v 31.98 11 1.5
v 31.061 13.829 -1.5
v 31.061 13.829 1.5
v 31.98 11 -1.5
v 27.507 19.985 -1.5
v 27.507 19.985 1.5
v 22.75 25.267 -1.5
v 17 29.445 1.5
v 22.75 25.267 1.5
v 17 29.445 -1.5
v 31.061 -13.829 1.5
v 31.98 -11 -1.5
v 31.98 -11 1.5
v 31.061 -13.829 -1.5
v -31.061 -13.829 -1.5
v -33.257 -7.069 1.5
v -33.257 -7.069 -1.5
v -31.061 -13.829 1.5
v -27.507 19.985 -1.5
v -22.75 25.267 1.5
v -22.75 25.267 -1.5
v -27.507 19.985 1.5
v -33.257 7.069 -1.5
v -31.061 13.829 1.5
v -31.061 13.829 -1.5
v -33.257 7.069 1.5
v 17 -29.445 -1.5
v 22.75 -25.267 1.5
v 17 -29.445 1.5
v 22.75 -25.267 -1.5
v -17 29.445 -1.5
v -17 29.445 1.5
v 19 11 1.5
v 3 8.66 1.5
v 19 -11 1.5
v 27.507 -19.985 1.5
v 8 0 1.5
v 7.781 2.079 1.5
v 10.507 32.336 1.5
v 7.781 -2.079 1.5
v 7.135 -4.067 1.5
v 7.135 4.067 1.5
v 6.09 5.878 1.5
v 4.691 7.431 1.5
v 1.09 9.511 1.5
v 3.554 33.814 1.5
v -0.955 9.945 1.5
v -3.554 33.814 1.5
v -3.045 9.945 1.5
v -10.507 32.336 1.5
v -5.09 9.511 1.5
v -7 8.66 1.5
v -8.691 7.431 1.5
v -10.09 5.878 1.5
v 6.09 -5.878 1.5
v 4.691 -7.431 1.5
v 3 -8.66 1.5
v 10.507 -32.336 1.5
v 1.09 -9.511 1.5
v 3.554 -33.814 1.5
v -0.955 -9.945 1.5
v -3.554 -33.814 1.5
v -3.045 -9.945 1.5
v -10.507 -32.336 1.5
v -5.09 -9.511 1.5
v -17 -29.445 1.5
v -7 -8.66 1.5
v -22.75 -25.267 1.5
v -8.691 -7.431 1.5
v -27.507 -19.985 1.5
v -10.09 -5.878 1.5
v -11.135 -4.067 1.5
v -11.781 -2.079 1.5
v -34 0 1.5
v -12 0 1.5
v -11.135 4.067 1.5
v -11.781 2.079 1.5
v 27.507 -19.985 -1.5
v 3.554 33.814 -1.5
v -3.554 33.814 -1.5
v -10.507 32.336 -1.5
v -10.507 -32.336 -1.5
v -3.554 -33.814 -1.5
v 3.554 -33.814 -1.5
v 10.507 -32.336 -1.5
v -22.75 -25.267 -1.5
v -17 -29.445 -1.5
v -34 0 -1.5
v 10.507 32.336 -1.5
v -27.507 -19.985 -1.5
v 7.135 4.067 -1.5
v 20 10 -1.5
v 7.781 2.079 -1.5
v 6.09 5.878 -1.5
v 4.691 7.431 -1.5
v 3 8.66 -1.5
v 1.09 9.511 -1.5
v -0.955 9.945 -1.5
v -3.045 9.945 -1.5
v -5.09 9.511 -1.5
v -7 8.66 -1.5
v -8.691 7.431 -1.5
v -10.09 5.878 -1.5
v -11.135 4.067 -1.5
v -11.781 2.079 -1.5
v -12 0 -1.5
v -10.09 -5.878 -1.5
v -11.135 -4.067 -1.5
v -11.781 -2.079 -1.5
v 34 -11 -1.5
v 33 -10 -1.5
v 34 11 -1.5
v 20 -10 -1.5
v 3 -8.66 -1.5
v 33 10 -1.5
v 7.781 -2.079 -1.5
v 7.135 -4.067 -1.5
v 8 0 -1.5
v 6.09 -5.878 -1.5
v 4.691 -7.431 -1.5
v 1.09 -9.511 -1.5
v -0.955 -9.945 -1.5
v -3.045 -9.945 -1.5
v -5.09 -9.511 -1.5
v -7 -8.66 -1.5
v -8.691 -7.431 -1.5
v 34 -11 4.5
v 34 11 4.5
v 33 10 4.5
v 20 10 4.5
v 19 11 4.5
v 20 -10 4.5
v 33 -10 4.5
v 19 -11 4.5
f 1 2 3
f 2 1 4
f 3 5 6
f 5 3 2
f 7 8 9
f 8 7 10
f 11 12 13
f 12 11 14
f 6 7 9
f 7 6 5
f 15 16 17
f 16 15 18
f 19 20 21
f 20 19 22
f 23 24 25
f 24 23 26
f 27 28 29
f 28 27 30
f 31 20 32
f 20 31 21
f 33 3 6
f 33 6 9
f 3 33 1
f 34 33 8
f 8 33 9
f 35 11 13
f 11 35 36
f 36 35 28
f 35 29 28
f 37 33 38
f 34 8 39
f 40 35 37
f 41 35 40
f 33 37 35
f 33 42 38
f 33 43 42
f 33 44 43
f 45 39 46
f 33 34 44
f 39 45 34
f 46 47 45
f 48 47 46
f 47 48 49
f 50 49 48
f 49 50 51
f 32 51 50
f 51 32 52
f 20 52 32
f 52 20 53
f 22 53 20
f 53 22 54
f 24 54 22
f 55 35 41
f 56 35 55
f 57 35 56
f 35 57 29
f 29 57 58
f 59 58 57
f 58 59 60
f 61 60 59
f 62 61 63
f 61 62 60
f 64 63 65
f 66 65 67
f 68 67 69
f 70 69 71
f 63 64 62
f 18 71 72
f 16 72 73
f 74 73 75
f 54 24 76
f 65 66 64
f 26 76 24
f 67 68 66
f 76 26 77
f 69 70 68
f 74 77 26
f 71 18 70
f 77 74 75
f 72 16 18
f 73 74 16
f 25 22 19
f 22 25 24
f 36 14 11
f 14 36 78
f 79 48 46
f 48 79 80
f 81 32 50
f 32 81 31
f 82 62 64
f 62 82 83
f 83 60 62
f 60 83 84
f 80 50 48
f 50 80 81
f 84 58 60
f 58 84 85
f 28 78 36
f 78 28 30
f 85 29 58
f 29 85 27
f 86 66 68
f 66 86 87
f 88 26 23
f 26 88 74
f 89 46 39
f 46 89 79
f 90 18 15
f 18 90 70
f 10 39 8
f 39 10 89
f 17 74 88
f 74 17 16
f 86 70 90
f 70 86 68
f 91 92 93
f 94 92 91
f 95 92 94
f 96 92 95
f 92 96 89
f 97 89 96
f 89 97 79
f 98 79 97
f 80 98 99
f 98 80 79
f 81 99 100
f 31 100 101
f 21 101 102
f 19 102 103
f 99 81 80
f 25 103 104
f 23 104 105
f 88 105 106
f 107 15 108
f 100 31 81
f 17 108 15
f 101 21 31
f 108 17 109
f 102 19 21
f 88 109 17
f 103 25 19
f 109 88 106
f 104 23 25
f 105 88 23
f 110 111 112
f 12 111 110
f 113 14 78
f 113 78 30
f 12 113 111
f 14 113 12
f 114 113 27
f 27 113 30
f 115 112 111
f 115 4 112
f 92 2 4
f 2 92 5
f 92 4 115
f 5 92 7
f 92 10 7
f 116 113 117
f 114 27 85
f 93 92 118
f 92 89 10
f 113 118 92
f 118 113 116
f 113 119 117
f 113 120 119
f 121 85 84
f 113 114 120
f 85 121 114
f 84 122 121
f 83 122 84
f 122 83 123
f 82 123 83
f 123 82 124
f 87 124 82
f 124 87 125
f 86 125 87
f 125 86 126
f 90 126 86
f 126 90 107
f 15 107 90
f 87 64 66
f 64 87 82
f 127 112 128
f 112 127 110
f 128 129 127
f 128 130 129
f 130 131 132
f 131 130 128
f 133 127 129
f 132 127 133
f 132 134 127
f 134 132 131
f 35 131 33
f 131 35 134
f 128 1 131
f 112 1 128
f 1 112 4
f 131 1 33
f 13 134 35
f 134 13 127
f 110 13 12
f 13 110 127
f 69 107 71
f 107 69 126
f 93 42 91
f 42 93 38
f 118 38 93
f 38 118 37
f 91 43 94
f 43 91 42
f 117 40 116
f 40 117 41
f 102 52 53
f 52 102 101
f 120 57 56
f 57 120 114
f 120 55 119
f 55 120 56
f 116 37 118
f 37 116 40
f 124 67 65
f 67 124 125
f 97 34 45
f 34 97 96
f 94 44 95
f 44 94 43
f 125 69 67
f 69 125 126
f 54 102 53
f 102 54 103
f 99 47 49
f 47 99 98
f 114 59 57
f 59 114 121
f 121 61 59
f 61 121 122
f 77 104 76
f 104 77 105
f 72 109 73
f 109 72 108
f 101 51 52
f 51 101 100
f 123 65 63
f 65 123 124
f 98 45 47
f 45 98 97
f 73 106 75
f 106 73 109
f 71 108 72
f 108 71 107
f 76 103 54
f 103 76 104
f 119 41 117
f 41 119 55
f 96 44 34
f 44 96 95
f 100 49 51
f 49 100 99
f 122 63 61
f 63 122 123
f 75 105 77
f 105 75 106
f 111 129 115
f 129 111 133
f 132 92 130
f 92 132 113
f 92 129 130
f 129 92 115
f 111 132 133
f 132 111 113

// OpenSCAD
// A very simple insert for the luxo lamp head
//
// See example: http://www.flickr.com/photos/92244914@N04/11577951703/
// Luxo lamp available on Thingiverse:  http://www.thingiverse.com/thing:27350
//
// Instructions:
// Attach leds, switch and wire to this part, and then push it into the
// lamp head.

 r_module = 68/2;
h_module = 3;

w_switch = 13;
l_switch = 20;
h_switch = 3;

r_led_mount = 40/2/2;

module luxo_led_module() { // make me
  difference() {
    union() {
    cylinder(r=r_module, h=h_module, center=true);
    translate([r_module - w_switch/2 - 1, 0, h_switch/2])
      cube([w_switch+2, l_switch+2, h_module + h_switch], center=true);
    }
    // cutout for led module
    translate([-2, 0, 0])
    cylinder(r=r_led_mount, h=h_module + 1, center=true);
    // cutout for switch
    translate([r_module - w_switch/2 - 1, 0, h_switch/2])
      cube([w_switch, l_switch, h_module + h_switch + 1], center=true);
  }
}

luxo_led_module();
